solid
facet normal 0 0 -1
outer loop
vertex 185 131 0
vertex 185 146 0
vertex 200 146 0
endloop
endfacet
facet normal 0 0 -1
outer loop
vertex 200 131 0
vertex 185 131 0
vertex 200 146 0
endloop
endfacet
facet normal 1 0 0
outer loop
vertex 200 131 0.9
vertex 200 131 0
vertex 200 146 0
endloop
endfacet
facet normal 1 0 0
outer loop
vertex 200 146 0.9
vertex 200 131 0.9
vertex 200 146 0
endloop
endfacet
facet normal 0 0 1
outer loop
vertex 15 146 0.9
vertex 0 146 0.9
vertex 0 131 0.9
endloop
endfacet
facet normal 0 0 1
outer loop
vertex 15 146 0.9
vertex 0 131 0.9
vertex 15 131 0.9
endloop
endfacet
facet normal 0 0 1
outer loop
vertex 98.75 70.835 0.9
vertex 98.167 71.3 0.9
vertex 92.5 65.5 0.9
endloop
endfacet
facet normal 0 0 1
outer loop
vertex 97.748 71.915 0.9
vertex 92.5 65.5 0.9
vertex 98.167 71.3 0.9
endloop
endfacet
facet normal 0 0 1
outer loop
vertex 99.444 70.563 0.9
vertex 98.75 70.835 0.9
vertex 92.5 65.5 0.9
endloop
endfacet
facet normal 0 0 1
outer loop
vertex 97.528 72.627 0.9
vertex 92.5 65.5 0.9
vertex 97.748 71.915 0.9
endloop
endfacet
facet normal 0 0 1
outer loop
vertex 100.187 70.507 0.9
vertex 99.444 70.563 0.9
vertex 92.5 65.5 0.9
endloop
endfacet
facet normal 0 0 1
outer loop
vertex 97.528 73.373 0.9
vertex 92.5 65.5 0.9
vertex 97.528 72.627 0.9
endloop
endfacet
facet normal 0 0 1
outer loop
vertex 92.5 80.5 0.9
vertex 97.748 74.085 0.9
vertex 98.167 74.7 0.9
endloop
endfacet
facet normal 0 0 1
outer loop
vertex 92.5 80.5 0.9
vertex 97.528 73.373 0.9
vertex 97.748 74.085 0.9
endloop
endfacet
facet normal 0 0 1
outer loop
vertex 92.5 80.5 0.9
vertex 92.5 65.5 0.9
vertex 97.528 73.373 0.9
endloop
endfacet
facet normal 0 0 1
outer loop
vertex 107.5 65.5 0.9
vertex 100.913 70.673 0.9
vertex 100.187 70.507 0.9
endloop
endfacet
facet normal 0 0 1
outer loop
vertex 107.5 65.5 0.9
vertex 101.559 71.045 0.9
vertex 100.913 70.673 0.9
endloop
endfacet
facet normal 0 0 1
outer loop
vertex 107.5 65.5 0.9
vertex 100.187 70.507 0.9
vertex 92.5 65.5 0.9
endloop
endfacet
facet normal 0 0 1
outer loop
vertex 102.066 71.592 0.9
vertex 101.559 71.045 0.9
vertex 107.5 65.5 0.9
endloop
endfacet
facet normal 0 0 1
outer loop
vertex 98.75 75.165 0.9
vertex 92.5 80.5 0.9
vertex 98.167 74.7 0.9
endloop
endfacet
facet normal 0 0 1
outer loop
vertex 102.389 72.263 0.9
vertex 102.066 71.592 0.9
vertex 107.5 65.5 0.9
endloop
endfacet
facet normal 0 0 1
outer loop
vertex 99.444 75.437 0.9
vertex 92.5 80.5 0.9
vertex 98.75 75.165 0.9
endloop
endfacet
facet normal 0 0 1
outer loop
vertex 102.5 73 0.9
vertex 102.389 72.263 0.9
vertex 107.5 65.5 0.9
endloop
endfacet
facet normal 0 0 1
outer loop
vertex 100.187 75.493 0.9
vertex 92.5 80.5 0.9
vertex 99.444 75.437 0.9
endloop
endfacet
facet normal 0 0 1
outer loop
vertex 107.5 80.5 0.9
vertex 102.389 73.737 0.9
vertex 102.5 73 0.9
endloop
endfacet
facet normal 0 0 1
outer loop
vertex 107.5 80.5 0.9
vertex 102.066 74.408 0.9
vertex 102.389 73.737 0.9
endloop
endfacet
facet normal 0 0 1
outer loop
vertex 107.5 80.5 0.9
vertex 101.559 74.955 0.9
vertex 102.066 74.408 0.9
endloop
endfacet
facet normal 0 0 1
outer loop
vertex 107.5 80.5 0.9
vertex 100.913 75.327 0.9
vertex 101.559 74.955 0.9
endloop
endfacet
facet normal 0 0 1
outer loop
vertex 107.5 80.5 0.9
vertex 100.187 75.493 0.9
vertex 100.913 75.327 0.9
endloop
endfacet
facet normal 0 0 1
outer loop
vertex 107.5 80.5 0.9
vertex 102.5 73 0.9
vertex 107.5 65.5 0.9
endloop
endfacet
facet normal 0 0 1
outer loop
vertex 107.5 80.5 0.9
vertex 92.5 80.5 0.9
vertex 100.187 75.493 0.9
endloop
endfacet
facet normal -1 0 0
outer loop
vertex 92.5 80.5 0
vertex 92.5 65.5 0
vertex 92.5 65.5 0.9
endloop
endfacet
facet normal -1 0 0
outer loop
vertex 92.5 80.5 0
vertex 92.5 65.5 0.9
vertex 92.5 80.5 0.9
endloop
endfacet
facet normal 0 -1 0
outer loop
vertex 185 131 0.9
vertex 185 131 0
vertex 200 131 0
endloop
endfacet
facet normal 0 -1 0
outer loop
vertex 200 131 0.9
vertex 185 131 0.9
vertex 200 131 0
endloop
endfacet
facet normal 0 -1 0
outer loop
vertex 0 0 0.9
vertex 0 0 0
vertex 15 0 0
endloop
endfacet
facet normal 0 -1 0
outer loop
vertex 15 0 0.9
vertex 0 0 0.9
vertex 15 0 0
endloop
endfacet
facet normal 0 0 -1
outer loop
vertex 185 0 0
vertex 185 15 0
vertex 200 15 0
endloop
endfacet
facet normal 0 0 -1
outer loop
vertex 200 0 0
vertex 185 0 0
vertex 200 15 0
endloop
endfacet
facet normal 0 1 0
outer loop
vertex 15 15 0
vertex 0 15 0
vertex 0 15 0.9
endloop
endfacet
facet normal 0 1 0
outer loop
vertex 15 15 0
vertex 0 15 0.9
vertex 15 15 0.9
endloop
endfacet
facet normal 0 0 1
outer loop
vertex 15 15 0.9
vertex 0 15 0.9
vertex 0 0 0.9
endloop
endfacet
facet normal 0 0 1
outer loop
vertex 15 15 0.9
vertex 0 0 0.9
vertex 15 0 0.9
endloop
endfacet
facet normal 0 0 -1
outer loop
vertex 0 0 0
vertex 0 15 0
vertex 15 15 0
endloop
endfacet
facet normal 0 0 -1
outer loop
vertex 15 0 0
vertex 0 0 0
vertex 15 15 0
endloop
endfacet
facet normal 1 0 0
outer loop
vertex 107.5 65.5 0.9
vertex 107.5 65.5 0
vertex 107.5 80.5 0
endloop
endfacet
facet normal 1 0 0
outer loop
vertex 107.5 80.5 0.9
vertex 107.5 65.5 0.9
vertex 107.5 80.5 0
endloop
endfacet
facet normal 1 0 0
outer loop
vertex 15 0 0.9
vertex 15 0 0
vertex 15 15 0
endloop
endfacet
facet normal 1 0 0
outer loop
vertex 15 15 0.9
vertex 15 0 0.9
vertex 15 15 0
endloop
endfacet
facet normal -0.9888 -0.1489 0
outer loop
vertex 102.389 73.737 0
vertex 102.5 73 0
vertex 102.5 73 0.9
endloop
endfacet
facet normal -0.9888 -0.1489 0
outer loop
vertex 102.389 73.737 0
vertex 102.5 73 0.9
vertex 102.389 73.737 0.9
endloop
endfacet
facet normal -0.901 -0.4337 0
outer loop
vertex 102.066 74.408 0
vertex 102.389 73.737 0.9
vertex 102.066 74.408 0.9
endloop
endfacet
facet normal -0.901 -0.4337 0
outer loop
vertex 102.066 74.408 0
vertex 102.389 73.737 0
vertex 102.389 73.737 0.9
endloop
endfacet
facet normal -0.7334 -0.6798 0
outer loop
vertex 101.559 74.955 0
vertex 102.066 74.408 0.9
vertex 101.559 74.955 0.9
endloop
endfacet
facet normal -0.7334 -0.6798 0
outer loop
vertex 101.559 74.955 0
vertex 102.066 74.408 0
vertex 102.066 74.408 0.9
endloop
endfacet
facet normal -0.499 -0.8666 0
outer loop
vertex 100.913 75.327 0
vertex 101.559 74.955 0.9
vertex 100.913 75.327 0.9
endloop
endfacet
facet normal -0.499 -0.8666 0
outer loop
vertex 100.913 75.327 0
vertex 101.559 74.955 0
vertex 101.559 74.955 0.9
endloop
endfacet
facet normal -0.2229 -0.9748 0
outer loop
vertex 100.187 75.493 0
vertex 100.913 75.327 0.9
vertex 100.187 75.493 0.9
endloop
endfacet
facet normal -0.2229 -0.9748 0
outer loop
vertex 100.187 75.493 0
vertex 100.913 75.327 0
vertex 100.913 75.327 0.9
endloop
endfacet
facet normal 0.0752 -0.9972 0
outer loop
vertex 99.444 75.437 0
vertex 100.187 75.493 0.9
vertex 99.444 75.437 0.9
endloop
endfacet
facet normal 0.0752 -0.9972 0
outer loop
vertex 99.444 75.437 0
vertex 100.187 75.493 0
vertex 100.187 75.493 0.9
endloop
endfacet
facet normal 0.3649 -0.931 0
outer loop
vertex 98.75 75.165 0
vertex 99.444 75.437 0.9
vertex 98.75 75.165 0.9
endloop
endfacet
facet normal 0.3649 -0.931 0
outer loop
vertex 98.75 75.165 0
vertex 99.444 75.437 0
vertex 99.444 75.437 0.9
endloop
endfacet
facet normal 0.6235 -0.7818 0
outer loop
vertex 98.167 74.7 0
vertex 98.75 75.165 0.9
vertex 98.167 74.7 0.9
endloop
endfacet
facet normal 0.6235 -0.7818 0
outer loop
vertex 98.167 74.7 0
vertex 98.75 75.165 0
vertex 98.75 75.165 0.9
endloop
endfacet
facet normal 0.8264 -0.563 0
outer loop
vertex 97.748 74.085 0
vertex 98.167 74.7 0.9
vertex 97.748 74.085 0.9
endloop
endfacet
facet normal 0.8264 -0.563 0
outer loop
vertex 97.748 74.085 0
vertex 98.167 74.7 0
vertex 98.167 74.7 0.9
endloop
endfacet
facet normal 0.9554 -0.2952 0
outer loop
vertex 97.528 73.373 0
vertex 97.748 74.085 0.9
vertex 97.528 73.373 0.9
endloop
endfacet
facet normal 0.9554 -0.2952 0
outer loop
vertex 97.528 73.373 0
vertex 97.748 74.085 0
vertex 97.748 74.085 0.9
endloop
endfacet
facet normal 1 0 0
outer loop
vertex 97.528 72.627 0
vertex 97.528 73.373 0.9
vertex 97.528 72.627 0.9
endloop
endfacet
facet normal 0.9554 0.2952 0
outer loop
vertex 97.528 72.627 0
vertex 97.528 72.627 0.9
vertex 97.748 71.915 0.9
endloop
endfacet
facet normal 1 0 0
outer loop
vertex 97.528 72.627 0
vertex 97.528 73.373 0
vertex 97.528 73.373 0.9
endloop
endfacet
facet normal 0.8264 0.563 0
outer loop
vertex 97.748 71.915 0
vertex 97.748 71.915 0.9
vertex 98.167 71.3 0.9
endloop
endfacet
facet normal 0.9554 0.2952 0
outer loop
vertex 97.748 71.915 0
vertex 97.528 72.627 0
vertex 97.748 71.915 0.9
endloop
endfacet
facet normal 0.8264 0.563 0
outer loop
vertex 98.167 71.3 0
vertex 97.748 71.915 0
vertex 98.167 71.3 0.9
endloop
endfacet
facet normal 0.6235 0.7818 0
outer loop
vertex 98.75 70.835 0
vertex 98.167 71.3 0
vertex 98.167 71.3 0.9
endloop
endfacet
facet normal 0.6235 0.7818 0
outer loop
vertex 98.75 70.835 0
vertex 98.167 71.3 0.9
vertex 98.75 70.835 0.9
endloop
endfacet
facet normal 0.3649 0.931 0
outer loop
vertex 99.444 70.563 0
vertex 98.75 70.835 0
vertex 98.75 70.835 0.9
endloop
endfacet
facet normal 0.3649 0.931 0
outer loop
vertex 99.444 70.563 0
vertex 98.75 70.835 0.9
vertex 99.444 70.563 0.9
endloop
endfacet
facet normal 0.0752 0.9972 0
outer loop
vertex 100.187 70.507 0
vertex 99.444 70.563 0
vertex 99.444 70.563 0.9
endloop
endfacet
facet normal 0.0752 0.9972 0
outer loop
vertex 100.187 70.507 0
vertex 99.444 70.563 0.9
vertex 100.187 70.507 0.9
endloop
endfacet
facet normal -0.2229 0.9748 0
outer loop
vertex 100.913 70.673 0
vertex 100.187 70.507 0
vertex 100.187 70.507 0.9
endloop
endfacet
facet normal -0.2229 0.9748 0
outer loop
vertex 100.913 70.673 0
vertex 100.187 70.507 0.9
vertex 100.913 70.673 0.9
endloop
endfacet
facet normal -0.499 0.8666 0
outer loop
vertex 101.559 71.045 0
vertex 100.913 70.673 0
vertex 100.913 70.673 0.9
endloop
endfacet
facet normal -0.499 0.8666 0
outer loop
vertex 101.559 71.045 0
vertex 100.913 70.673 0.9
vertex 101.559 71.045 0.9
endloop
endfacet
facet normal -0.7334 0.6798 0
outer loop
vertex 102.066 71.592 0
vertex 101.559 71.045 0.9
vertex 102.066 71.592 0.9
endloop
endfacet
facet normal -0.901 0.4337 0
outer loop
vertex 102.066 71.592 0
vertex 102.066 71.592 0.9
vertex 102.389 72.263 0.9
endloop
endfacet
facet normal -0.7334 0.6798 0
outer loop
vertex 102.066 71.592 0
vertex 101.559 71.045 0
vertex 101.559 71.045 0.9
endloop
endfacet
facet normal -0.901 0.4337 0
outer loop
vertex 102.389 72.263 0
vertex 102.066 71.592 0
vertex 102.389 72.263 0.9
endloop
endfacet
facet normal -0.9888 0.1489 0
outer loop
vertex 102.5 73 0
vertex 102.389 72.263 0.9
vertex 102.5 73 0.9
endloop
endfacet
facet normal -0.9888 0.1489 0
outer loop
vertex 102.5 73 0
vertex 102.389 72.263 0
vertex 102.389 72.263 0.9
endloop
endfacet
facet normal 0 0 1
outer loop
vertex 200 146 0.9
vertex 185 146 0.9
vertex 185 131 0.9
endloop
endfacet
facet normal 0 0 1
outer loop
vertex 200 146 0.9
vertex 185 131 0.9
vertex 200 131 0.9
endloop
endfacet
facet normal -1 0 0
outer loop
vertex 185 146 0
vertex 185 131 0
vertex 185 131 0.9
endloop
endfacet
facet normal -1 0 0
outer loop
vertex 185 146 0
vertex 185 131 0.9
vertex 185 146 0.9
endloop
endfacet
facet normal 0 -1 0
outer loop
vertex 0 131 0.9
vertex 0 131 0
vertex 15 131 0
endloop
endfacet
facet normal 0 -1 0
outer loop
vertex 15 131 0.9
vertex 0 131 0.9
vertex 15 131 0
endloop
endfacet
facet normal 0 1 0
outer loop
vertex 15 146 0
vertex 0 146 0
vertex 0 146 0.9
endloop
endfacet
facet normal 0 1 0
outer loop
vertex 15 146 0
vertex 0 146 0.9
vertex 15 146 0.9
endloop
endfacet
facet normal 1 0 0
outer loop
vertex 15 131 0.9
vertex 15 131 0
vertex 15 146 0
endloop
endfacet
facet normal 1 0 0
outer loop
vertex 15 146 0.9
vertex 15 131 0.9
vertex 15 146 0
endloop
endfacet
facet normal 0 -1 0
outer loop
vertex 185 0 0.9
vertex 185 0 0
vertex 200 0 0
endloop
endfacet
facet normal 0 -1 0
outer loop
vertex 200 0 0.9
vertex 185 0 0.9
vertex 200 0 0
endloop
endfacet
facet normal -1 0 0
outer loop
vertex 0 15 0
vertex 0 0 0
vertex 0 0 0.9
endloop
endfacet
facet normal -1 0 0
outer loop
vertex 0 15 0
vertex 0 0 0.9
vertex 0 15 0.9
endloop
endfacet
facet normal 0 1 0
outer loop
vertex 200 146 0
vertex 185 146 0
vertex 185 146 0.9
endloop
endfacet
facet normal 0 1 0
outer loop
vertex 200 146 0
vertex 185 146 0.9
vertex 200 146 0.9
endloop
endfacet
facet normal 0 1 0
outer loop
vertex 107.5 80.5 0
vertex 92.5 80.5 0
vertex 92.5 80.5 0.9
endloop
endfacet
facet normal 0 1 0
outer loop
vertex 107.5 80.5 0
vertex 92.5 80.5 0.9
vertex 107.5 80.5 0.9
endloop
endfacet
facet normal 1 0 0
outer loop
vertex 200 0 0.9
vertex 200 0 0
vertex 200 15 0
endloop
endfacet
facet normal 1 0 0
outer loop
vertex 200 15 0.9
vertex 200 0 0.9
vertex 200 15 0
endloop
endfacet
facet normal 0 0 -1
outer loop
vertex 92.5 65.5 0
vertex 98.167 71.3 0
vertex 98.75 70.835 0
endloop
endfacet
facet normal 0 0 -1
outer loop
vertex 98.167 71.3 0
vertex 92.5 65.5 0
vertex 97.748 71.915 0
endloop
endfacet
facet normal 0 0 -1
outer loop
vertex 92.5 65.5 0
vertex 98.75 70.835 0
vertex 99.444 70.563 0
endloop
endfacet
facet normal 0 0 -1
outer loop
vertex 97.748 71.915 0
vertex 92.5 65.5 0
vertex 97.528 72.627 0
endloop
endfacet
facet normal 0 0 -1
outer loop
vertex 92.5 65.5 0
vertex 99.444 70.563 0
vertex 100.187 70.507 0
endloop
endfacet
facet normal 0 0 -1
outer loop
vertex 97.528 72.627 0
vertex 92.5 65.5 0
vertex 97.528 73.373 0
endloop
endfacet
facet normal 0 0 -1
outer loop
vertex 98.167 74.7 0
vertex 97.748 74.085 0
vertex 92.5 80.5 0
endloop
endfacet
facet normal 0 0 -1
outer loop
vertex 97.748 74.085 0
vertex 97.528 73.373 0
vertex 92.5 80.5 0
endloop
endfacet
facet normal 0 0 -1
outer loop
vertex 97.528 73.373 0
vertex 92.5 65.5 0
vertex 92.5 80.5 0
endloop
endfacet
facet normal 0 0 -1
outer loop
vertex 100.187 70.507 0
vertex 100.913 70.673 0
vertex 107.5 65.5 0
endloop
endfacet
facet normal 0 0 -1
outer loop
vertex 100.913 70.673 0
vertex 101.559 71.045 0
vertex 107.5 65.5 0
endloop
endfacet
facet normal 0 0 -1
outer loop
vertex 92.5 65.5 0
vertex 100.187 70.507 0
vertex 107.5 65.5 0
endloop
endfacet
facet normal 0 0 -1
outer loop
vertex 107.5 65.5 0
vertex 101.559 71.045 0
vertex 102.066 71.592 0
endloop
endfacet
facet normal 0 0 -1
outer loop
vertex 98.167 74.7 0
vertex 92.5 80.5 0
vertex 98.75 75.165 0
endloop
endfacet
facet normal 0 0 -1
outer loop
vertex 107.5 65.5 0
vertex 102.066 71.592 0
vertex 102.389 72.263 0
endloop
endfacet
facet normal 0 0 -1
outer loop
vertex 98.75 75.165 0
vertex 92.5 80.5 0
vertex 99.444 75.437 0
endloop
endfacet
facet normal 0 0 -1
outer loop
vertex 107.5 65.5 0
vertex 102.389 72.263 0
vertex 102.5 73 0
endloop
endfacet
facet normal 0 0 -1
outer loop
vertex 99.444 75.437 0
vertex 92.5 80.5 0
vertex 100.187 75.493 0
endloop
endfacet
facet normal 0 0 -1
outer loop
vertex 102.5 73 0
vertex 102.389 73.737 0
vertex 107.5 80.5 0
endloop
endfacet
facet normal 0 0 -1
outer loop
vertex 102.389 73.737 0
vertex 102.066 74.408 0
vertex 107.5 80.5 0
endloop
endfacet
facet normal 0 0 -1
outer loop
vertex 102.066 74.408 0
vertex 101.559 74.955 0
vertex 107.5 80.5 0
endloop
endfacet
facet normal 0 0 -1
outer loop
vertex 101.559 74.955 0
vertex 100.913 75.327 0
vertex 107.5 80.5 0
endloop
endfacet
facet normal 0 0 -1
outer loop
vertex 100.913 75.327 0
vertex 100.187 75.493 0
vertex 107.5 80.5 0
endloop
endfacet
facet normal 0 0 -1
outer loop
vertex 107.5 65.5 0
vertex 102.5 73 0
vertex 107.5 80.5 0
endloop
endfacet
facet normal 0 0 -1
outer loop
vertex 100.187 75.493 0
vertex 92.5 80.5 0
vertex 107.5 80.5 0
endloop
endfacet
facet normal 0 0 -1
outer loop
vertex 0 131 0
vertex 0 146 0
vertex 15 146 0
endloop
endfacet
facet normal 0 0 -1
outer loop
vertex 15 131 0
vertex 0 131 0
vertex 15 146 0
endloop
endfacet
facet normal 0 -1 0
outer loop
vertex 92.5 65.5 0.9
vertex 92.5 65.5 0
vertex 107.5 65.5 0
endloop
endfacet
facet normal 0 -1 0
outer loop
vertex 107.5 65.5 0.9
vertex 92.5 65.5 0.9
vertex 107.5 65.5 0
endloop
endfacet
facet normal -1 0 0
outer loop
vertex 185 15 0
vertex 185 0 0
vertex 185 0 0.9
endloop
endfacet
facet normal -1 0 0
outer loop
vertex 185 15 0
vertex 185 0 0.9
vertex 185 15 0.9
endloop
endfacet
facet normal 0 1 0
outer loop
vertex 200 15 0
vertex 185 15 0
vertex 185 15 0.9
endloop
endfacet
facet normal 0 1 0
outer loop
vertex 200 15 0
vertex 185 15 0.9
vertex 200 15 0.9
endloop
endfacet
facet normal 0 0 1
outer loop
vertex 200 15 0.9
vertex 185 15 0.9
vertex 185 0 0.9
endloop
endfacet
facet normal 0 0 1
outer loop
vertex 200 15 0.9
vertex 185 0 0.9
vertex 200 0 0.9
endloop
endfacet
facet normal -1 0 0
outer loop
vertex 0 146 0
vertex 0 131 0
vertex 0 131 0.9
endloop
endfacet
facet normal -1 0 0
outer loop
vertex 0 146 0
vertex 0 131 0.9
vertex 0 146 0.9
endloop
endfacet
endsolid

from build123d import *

# Parameters (mm, degrees)
F0_W     = 15
F0_H     = 15
F0_R     = 2.5
F1_DEPTH = 0.9


with BuildPart() as f1:
    # F0 (on Top) → F1 (new body)
    with BuildSketch(Plane.XY):
        with Locations((7.5, 7.5)):
            Rectangle(F0_W, F0_H)
        with Locations((192.5, 7.5)):
            Rectangle(F0_W, F0_H)
        with Locations((192.5, 138.5)):
            Rectangle(F0_W, F0_H)
        with Locations((7.5, 138.5)):
            Rectangle(F0_W, F0_H)
        with Locations((100, 73)):
            Rectangle(F0_W, F0_H)
        with Locations((100, 73)):
            Circle(F0_R, mode=Mode.SUBTRACT)
    extrude(amount=F1_DEPTH)


solid = f1.part
